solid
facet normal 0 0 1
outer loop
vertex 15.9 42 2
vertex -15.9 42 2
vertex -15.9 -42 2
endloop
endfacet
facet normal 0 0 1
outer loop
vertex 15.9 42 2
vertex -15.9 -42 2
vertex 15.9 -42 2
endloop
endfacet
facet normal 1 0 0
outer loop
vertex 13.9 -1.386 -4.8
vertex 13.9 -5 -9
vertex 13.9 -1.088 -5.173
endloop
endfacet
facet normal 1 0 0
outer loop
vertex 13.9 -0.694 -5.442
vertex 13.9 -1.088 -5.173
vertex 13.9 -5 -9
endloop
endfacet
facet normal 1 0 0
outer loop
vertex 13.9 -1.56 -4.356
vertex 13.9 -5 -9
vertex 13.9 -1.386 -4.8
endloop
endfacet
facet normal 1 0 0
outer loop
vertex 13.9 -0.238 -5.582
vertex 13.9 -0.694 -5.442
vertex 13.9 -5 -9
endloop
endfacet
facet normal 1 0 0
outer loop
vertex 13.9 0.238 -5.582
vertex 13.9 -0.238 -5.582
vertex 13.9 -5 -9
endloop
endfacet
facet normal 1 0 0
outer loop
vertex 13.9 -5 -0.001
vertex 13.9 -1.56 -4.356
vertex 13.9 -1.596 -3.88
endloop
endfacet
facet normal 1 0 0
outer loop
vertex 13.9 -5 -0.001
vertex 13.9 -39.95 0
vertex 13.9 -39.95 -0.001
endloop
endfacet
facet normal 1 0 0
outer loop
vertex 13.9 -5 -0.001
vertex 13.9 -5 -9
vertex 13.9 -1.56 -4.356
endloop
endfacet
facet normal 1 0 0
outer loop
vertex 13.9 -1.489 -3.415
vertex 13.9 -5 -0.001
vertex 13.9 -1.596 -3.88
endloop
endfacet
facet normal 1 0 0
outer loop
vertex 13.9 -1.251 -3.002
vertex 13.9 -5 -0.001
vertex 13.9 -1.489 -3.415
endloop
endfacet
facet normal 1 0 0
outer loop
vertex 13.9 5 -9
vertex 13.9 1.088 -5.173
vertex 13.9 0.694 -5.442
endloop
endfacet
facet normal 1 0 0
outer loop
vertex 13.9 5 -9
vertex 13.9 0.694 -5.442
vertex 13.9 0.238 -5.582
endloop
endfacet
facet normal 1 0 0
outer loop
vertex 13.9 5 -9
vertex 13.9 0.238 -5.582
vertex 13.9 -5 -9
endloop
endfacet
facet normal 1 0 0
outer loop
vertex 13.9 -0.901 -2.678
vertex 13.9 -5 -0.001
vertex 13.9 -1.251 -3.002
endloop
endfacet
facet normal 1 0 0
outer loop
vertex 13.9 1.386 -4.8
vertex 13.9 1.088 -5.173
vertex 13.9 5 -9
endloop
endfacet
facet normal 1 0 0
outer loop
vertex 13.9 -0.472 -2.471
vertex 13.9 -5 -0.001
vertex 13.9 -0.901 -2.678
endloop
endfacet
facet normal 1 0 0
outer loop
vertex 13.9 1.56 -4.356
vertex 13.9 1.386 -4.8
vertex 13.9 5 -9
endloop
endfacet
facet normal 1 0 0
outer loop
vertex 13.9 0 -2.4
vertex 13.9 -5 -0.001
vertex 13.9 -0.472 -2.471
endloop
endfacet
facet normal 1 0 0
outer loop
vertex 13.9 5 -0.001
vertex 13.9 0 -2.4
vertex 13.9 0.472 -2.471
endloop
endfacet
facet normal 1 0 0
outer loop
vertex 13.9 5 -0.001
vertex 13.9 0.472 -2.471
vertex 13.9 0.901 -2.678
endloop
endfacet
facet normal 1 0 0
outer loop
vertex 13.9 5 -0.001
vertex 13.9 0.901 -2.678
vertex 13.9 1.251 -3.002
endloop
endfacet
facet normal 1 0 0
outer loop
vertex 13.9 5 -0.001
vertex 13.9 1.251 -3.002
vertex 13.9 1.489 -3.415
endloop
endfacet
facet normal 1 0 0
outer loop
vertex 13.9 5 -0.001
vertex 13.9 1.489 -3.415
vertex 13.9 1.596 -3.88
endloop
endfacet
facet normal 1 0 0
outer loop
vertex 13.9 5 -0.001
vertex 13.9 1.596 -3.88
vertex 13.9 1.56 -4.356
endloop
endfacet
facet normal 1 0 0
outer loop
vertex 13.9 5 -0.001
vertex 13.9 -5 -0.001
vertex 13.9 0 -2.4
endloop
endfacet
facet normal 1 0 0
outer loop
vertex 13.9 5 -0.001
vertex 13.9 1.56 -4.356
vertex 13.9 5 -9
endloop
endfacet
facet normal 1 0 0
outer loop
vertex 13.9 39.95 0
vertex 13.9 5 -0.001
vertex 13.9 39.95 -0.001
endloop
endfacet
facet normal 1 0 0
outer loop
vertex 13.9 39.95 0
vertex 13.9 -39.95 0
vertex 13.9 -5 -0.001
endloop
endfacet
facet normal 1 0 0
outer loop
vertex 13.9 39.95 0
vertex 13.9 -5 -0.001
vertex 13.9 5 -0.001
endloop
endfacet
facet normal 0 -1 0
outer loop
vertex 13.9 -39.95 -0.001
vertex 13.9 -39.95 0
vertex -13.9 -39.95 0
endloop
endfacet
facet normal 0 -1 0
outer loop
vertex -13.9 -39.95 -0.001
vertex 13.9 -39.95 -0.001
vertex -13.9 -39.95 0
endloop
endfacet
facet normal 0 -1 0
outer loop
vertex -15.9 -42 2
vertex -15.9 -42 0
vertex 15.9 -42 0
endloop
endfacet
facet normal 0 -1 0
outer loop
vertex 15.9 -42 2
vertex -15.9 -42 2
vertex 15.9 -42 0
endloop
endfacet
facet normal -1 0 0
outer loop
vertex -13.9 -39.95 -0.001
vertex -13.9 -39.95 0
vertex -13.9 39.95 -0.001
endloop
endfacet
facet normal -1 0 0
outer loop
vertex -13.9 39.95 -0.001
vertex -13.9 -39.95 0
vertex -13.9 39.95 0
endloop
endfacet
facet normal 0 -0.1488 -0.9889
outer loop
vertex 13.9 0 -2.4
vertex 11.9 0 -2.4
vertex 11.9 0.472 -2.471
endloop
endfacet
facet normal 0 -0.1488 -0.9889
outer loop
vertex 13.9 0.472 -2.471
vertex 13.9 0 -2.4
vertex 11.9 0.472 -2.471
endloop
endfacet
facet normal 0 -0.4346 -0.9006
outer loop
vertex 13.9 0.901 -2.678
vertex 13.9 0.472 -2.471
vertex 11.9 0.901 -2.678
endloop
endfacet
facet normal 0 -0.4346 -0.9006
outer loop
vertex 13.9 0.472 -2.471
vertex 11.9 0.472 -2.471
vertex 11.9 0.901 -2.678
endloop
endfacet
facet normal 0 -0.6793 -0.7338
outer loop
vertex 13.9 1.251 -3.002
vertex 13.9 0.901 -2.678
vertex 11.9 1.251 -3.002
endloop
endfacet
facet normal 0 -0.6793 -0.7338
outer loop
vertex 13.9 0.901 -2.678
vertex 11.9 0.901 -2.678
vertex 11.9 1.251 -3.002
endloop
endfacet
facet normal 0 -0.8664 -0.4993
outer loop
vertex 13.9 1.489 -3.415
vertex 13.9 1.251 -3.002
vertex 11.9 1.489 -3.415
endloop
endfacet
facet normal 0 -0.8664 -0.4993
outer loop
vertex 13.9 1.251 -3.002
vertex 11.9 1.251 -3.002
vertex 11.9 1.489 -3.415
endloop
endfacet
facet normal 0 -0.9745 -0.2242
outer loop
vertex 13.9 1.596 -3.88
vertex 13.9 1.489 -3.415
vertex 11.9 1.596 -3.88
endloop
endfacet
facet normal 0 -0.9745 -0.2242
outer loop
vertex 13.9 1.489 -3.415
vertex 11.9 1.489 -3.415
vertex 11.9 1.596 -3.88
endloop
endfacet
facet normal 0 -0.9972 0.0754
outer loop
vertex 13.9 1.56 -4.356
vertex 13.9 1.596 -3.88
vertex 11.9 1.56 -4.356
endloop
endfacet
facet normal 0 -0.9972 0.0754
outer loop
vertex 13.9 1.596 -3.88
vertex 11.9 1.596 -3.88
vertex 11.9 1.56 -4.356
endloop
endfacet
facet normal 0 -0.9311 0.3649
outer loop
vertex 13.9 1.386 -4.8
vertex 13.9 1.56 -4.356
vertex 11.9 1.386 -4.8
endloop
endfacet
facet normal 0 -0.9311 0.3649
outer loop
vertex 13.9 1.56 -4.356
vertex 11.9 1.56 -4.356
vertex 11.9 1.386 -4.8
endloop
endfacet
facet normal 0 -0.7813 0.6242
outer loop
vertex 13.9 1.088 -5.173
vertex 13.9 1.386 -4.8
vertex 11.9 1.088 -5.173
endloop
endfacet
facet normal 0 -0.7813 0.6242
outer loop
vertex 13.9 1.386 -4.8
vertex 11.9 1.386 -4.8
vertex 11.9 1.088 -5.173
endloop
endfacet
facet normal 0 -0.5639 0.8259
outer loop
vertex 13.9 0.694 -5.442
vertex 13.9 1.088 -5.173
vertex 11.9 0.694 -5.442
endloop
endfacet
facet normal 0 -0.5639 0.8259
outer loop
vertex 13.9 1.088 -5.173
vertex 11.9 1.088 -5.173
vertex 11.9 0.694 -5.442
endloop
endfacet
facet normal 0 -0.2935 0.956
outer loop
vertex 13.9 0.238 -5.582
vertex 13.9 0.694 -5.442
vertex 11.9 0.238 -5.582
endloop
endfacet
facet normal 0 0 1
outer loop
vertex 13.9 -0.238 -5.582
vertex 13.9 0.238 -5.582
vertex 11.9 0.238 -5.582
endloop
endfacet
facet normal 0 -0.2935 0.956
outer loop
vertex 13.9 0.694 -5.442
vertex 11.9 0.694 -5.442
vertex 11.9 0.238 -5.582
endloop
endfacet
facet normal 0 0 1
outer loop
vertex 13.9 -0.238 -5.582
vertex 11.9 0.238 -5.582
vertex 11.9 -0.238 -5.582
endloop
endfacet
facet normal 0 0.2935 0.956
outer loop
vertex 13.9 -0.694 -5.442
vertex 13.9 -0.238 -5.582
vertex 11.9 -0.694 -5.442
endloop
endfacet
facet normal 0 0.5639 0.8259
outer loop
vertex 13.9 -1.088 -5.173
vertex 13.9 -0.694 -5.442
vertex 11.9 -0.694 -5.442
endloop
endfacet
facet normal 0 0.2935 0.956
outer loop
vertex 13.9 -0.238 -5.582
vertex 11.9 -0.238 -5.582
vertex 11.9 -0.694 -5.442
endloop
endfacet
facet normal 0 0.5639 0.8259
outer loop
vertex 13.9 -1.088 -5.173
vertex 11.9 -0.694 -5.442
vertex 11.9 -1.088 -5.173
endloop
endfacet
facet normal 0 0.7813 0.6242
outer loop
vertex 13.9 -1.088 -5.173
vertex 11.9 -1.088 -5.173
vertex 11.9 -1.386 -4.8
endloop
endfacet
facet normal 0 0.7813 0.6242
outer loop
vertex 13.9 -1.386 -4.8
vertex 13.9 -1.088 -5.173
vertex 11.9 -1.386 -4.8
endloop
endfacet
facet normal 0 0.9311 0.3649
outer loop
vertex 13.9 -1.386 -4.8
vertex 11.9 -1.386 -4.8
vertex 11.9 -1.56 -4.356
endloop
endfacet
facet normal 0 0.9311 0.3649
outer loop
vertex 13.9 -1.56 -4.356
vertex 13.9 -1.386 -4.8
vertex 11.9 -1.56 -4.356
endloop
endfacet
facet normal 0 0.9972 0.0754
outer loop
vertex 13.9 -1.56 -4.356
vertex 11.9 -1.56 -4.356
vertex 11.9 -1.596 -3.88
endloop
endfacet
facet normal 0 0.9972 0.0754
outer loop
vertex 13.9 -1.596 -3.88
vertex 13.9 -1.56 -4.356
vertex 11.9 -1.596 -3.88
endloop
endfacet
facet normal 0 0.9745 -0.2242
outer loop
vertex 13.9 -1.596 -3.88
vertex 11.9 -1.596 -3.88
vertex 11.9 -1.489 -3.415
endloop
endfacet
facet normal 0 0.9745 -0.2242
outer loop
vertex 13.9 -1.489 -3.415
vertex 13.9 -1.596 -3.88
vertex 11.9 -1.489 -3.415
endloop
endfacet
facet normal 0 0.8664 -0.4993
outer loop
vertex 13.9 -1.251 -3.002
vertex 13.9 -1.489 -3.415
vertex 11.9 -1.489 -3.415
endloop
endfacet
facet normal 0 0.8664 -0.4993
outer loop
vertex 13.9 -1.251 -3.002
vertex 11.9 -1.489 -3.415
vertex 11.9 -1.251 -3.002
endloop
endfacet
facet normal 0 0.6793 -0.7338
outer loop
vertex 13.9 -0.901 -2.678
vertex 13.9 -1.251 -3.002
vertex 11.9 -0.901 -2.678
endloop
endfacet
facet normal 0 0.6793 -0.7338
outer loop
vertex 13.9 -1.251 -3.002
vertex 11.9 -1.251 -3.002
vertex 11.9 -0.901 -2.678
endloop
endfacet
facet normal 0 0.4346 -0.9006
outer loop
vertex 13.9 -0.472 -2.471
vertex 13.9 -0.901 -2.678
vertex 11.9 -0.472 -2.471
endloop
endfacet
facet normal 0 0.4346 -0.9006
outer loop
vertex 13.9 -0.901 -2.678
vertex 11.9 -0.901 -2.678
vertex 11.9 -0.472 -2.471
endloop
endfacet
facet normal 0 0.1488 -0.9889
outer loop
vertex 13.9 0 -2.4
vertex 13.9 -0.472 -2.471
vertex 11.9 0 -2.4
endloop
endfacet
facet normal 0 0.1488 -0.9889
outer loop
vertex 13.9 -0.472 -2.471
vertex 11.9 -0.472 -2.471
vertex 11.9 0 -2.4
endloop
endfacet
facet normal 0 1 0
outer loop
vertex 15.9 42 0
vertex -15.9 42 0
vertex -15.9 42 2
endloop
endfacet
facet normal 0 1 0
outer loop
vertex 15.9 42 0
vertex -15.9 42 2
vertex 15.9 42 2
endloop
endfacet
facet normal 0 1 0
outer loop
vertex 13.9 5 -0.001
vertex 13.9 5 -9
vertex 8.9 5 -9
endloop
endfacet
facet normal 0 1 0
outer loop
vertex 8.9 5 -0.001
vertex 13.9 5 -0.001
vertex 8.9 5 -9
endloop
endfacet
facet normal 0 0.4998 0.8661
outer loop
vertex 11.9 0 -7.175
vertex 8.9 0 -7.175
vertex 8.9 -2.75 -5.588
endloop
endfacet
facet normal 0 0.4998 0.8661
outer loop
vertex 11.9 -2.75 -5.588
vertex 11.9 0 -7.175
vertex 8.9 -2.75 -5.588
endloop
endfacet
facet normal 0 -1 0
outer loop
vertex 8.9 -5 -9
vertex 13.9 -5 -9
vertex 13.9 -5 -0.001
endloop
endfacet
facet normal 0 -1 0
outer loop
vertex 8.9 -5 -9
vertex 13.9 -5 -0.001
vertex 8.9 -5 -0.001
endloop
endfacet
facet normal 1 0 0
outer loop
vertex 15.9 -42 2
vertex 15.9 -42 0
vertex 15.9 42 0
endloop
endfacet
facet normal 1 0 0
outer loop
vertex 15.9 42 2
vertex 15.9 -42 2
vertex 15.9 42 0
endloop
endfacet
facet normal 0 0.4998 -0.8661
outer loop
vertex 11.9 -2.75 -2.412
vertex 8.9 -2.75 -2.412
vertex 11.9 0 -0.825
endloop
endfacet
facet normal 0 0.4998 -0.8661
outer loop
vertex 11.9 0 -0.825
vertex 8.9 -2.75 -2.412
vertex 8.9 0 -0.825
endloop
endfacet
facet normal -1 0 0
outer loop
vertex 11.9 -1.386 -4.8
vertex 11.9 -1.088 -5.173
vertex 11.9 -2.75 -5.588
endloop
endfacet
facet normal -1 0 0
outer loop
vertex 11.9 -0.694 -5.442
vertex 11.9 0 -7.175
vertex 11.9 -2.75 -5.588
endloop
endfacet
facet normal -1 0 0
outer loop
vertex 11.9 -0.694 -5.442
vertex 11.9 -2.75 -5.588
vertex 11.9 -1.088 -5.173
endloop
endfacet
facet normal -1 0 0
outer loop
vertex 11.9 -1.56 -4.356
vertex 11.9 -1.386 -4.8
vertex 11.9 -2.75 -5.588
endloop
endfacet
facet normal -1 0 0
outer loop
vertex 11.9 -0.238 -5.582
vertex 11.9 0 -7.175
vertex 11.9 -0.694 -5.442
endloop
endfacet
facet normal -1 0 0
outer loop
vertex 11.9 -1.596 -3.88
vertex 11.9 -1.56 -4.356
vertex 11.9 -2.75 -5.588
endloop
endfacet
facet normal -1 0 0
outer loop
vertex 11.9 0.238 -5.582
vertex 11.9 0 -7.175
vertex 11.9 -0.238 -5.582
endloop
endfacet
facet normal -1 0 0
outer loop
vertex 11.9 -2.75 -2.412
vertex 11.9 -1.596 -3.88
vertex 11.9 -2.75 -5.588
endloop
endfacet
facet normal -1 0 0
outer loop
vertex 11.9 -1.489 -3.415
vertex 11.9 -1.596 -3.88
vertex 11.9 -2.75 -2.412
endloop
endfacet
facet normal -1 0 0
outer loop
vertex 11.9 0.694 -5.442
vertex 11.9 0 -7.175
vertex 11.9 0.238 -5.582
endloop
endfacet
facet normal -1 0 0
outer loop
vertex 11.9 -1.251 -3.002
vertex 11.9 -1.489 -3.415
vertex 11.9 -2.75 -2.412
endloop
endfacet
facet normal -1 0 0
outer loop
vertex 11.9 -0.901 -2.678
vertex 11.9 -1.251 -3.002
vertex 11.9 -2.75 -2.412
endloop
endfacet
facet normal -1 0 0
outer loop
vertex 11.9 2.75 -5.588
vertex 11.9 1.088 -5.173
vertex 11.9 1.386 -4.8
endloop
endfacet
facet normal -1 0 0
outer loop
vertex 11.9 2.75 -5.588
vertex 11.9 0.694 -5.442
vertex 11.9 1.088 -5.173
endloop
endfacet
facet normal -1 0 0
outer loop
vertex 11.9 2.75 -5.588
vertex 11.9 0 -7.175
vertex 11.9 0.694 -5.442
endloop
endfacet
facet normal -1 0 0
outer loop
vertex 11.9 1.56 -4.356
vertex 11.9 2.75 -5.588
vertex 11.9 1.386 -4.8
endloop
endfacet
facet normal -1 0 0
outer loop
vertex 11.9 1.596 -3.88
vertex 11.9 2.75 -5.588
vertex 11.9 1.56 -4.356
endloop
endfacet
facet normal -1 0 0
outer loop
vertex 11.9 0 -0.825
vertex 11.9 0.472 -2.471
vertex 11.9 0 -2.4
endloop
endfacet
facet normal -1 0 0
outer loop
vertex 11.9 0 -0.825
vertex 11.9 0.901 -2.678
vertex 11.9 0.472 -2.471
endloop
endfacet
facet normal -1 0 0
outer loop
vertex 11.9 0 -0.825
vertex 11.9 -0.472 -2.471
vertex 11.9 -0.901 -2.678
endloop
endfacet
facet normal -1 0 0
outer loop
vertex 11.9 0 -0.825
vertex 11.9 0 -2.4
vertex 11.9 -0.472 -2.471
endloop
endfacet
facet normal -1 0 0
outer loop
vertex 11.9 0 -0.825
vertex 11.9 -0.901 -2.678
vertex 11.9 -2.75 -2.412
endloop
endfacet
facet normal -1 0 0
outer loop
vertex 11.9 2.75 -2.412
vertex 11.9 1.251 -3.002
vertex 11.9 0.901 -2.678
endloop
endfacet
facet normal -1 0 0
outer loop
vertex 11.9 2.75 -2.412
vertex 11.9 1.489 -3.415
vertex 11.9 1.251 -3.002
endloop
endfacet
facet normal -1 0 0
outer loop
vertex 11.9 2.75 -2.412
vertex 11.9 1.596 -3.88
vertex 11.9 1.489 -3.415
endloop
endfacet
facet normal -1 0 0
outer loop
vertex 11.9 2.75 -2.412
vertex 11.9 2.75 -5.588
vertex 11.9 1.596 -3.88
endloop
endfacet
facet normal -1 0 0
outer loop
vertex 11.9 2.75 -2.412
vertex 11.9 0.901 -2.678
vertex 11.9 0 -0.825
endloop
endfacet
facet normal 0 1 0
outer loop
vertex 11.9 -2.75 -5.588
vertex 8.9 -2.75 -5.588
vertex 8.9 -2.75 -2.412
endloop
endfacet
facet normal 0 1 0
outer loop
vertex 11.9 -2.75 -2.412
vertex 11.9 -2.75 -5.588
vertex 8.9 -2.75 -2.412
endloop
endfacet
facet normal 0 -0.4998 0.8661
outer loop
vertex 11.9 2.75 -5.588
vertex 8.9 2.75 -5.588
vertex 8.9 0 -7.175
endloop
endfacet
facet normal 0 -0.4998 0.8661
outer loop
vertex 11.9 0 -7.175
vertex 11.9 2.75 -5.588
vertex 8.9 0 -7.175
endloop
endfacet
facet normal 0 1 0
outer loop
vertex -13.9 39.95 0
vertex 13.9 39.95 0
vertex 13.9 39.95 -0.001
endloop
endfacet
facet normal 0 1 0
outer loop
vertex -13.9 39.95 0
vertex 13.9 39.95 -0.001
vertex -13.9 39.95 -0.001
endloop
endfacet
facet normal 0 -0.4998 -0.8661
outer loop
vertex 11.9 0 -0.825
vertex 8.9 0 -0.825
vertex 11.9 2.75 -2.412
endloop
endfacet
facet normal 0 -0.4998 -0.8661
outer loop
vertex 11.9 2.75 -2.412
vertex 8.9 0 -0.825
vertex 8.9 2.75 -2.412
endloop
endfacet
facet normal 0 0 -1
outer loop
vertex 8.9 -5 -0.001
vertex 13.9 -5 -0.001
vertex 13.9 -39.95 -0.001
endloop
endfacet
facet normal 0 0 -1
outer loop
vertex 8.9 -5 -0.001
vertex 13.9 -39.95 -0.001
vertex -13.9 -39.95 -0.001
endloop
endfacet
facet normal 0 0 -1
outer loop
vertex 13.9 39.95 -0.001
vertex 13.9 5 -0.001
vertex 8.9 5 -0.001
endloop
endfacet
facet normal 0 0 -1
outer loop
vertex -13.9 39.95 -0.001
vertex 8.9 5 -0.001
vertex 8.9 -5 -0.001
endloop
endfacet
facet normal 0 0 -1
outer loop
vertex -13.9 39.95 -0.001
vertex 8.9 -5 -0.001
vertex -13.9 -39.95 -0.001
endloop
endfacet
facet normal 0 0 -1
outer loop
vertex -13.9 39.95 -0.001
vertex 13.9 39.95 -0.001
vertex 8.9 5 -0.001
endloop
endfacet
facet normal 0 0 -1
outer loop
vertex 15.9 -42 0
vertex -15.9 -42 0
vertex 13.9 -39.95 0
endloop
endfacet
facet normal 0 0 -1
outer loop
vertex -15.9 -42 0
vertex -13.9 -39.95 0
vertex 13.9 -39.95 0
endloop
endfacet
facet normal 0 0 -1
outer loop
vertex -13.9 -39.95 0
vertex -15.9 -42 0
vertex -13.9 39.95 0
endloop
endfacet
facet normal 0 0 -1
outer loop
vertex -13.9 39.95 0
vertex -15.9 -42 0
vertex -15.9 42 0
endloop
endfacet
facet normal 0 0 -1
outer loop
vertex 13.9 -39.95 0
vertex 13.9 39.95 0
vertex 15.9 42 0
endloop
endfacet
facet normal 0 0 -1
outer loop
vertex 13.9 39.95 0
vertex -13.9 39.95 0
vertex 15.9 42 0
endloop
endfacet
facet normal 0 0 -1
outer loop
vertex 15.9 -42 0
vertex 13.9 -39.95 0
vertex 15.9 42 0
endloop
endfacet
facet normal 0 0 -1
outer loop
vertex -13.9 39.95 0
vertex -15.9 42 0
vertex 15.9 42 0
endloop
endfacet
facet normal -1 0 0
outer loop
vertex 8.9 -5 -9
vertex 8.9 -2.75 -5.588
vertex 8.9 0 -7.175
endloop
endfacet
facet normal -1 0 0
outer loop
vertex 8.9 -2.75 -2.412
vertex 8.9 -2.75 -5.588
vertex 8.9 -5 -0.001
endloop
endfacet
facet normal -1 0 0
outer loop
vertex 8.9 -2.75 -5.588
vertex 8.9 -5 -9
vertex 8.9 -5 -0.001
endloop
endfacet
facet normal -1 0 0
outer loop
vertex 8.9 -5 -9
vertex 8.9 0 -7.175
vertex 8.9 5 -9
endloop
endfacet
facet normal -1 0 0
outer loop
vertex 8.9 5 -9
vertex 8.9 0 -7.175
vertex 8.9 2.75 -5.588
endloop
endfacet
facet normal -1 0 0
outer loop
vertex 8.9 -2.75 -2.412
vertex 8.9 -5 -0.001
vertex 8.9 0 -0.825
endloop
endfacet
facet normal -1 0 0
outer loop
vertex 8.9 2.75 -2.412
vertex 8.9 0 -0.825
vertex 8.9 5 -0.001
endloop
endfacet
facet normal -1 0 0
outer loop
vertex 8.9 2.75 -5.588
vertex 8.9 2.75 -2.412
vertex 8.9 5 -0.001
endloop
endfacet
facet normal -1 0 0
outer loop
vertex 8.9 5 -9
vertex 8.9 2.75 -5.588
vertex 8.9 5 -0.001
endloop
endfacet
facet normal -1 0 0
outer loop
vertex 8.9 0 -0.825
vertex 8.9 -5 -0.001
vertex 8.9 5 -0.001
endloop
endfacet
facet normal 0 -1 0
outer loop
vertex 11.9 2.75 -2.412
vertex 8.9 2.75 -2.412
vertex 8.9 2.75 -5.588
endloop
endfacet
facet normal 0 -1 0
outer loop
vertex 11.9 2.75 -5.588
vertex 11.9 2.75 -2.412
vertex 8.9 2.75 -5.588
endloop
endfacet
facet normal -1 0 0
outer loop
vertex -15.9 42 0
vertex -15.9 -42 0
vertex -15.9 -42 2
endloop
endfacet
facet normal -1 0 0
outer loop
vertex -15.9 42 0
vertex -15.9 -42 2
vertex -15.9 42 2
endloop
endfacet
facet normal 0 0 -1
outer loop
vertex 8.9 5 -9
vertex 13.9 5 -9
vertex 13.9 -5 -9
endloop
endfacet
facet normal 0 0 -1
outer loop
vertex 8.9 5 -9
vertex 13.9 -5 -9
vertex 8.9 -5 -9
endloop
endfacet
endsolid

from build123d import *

# Parameters (mm, degrees)
SKETCH1_W           = 31.8
SKETCH1_H           = 84
BOSS_EXTRUDE1_DEPTH = 2
SKETCH2_W           = 27.8
SKETCH2_H           = 79.9
BOSS_EXTRUDE2_DEPTH = 0.001
SKETCH3_W           = 5
SKETCH3_H           = 10
BOSS_EXTRUDE3_DEPTH = 9
CUT_EXTRUDE1_DEPTH  = 3
SKETCH5_R           = 1.6
CUT_EXTRUDE2_DEPTH  = 2


with BuildPart() as part:
    # Sketch1 → Boss-Extrude1 (new body)
    with BuildSketch(Plane.XY):
        Rectangle(SKETCH1_W, SKETCH1_H)
    extrude(amount=BOSS_EXTRUDE1_DEPTH)

    # Sketch2 → Boss-Extrude2 (add)
    with BuildSketch(Plane(origin=(0, 0, 0), x_dir=(-1, 0, 0), z_dir=(0, 0, -1))):
        Rectangle(SKETCH2_W, SKETCH2_H)
    extrude(amount=BOSS_EXTRUDE2_DEPTH)

    # Sketch3 → Boss-Extrude3 (add)
    with BuildSketch(Plane(origin=(0, 0, 0), x_dir=(-1, 0, 0), z_dir=(0, 0, -1))):
        with Locations((-11.4, 0)):
            Rectangle(SKETCH3_W, SKETCH3_H)
    extrude(amount=BOSS_EXTRUDE3_DEPTH)

    # Sketch4 → Cut-Extrude1 (cut)
    with BuildSketch(Plane.ZY.offset(-8.9)):
        Polygon((-2.41228676, 2.75), (-5.58771324, 2.75), (-7.175426481, 0), (-5.58771324, -2.75), (-2.41228676, -2.75), (-0.824573519, 0), align=None)
    extrude(amount=-CUT_EXTRUDE1_DEPTH, mode=Mode.SUBTRACT)

    # Sketch5 → Cut-Extrude2 (cut)
    with BuildSketch(Plane.ZY.offset(-11.9)):
        with Locations((-4, 0)):
            Circle(SKETCH5_R)
    extrude(amount=-CUT_EXTRUDE2_DEPTH, mode=Mode.SUBTRACT)


solid = part.part
